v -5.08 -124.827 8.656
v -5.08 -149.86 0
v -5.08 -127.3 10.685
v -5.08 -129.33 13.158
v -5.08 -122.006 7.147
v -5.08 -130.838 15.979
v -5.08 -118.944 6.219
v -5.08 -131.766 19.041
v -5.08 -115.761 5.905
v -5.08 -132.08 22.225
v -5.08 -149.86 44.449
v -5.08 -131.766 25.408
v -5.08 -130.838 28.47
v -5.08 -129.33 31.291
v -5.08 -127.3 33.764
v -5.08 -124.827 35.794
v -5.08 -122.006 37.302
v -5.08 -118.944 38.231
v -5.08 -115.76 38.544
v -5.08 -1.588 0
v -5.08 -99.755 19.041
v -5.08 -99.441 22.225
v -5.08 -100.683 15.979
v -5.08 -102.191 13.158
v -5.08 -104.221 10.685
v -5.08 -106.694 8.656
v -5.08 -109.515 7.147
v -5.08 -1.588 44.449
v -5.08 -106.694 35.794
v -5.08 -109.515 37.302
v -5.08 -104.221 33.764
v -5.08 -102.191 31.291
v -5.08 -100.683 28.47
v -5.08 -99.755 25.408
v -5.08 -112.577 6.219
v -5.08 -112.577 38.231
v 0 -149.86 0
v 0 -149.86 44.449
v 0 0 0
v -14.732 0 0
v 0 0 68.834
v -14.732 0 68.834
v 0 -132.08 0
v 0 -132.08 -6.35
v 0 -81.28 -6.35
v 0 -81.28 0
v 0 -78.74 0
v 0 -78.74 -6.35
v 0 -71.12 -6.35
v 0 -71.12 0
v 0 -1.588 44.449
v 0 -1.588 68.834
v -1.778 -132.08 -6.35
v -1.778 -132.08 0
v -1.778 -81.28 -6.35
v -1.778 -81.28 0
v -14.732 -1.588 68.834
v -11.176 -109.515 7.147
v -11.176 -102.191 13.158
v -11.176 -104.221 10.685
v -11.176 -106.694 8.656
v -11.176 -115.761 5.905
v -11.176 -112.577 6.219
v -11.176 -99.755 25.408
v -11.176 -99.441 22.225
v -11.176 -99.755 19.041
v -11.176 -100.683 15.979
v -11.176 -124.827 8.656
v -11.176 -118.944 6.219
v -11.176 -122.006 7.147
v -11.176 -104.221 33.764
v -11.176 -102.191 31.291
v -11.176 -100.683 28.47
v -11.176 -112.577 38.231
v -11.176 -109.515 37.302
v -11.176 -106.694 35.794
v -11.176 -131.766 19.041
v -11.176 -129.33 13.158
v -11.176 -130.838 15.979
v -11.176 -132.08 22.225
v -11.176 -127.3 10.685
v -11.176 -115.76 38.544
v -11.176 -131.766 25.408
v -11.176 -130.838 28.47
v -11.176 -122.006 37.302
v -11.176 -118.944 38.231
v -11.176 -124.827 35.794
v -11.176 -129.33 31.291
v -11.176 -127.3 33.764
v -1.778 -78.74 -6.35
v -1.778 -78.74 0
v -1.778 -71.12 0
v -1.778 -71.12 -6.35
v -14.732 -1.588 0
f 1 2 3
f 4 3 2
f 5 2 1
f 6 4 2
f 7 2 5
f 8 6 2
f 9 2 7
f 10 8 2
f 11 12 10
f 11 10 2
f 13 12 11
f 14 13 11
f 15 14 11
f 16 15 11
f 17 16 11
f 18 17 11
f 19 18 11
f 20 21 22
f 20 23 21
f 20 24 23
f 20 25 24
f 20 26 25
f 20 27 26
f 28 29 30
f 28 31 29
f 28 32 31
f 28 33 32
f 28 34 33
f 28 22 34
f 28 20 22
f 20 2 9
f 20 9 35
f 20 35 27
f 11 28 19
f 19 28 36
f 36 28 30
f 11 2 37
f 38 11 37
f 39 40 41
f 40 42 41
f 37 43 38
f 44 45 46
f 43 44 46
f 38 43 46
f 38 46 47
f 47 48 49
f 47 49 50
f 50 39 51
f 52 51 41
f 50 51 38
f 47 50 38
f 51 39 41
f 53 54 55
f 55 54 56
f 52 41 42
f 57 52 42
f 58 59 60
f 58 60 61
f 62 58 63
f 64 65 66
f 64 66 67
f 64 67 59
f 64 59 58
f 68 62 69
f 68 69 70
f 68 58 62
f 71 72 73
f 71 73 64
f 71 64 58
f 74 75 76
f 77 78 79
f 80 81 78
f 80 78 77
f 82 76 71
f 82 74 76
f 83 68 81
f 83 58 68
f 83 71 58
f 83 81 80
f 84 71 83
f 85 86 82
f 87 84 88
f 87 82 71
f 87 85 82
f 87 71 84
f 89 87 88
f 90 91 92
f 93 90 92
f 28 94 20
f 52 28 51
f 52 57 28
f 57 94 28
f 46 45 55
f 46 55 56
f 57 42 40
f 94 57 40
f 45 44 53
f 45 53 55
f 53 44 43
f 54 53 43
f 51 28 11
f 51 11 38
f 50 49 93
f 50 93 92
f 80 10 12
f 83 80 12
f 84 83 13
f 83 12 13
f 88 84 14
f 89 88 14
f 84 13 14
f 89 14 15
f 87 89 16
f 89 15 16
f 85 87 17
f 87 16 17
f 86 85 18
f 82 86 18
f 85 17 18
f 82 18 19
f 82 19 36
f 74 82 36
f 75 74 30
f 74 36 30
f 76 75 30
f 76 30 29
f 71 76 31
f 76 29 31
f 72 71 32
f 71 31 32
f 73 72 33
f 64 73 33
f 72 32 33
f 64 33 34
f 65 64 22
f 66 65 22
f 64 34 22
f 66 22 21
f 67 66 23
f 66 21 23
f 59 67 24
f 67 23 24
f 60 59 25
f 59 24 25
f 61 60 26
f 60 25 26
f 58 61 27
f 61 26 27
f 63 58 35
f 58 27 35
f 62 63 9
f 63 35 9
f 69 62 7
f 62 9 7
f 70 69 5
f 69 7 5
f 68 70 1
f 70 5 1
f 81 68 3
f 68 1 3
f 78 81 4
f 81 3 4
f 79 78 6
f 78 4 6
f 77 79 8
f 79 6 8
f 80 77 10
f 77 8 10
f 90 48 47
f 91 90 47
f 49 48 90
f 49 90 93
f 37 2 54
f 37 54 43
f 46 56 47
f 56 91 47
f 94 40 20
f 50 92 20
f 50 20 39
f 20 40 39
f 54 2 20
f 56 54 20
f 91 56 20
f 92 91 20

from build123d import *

# Parameters (mm, degrees)
F0_W     = 5.08
F0_H     = 44.449404
F1_DEPTH = 149.86
F2_DEPTH = 1.5875
F3_W     = 7.62
F3_H     = 6.35
F3_W_2   = 50.8
F4_DEPTH = 1.778
F5_R     = 16.3195
F6_DEPTH = 6.096


with BuildPart() as f1:
    # F0 (on Front) → F1 (new body)
    with BuildSketch(Plane.XZ):
        with Locations((-2.54, 22.224702)):
            Rectangle(F0_W, F0_H)
    extrude(amount=F1_DEPTH)

    # F0 (on Front) → F2 (join)
    with BuildSketch(Plane.XZ):
        Polygon((-14.732, 0), (-5.08, 0), (-5.08, 44.449404), (0, 44.449404), (0, 68.834), (-14.732, 68.834), align=None)
    extrude(amount=F2_DEPTH)

    # F3 (on face) → F4 (join)
    with BuildSketch(Plane.YZ):
        with Locations((-74.93, -3.175)):
            Rectangle(F3_W, F3_H)
        with Locations((-106.68, -3.175)):
            Rectangle(F3_W_2, F3_H)
    extrude(amount=-F4_DEPTH)

    # F5 (on face) → F6 (join)
    with BuildSketch(Plane(origin=(-5.08, 0, 0), x_dir=(0, -1, 0), z_dir=(-1, 0, 0))):
        with Locations((115.7605, 22.224702)):
            Circle(F5_R)
    extrude(amount=F6_DEPTH)


solid = f1.part
